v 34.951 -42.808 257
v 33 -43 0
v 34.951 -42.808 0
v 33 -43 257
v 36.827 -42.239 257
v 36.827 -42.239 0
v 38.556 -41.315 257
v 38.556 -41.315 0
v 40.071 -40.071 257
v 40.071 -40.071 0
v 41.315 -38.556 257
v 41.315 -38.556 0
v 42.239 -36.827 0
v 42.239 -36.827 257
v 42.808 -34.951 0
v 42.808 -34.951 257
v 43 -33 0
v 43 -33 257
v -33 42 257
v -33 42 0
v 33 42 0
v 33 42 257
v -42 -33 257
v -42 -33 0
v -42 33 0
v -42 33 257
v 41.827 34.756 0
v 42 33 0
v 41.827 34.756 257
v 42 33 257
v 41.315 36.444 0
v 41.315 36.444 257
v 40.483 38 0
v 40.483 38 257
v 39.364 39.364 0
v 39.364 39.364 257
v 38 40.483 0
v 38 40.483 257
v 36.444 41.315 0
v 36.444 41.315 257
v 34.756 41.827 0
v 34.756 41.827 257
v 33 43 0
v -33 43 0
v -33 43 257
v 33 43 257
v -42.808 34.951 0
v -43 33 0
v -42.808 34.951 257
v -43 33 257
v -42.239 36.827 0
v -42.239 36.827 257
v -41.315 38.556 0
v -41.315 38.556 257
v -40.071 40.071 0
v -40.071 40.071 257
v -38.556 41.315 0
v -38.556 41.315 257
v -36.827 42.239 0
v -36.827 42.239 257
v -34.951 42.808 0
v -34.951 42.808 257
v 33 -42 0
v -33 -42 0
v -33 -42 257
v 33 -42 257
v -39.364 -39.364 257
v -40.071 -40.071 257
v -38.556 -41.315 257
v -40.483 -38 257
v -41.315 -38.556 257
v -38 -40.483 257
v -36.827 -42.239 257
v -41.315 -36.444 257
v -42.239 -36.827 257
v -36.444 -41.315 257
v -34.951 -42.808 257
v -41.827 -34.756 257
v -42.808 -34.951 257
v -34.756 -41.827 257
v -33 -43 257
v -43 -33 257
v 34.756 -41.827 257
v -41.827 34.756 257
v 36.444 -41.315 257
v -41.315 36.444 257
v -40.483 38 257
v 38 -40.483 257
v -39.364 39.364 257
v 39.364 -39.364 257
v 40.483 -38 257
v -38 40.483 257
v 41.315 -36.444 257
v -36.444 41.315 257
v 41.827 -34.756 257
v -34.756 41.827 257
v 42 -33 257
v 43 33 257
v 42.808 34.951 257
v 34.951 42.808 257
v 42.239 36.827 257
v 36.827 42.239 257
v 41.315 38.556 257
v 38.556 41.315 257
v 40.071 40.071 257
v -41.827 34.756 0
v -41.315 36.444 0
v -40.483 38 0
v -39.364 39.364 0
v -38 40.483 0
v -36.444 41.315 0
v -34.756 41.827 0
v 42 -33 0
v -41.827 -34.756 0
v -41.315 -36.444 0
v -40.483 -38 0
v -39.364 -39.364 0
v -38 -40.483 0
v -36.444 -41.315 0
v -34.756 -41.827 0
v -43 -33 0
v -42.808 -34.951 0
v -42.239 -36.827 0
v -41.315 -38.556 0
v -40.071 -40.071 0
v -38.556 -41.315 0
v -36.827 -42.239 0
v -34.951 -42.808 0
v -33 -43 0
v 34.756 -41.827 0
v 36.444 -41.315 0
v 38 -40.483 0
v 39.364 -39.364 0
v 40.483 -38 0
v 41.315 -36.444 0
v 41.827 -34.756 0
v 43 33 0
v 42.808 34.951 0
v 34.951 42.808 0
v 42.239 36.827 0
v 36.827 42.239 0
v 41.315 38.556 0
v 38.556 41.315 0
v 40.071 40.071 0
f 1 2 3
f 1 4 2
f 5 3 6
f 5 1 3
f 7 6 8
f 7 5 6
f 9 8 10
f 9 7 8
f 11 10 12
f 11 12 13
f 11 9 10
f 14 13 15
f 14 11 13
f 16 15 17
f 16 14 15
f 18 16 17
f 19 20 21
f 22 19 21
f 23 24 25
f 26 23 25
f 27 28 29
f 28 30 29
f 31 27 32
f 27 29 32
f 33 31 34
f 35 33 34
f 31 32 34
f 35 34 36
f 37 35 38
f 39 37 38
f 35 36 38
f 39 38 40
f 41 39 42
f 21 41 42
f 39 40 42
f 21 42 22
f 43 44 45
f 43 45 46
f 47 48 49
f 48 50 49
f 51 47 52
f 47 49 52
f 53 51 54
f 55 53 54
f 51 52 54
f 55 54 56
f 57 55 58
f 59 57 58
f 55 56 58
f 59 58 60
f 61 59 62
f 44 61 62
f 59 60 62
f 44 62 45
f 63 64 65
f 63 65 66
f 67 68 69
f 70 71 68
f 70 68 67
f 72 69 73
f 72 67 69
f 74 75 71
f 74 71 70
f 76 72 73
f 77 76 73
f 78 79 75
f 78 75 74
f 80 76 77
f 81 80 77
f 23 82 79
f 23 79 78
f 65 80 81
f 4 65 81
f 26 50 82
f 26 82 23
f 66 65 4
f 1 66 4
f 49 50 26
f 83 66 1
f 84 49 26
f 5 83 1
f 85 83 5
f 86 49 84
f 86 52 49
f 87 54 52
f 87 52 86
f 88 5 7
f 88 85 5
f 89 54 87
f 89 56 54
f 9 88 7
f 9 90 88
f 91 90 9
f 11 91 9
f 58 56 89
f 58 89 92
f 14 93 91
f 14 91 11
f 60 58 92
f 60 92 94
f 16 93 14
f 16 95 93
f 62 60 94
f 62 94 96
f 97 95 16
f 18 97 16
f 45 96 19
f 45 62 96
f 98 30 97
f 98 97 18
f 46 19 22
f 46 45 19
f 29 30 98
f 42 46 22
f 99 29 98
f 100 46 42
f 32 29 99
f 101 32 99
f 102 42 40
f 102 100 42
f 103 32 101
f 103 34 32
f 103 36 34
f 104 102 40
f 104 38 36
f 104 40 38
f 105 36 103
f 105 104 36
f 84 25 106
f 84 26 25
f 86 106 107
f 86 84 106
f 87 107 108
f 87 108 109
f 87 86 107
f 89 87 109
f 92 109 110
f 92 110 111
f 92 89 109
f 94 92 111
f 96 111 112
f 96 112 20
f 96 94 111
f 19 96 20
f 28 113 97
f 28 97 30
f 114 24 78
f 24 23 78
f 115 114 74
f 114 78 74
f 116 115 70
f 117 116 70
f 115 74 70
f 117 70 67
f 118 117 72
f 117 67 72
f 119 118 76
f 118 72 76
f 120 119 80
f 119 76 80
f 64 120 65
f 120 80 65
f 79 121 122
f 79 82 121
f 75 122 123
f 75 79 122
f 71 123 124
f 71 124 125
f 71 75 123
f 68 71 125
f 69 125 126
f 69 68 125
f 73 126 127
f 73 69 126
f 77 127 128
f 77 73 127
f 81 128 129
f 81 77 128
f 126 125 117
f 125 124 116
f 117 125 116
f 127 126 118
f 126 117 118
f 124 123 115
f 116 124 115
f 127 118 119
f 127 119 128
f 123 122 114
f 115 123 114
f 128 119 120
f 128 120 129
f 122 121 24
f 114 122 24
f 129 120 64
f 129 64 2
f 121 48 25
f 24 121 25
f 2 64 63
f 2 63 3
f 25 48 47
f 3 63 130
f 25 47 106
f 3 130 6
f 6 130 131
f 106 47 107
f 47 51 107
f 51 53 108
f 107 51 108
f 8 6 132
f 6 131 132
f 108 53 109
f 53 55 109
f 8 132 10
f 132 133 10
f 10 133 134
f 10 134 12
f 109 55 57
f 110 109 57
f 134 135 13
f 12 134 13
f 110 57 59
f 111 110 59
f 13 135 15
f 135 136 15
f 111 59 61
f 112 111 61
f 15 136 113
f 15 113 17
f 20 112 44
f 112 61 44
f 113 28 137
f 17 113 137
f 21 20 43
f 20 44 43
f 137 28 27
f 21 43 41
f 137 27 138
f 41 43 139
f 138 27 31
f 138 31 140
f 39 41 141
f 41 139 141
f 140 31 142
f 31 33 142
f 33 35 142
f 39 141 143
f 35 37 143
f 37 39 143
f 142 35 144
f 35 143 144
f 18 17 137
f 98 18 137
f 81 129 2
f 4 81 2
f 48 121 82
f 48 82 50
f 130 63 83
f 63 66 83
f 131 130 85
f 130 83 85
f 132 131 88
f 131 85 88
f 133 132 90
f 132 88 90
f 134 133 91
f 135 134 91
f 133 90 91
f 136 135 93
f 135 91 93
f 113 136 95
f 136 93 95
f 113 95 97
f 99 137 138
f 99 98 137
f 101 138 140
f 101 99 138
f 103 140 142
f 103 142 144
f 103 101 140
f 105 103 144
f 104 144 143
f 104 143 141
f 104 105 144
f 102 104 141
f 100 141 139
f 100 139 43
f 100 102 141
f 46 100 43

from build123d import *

# Parameters (mm, degrees)
F0_W     = 86
F0_H     = 86
F1_DEPTH = 257
F2_R     = 10
F3_T     = -1


with BuildPart() as f1:
    # F0 (on Top) → F1 (new body)
    with BuildSketch(Plane.XY):
        Rectangle(F0_W, F0_H)
    extrude(amount=F1_DEPTH)

    # F2
    f2_edges = [f1.edges().sort_by_distance(p)[0] for p in [
        (43, 43, 128.5),
        (-43, -43, 128.5),
        (43, -43, 128.5),
        (-43, 43, 128.5),
    ]]
    fillet(f2_edges, radius=F2_R)

    # F3
    f3_openings = [f1.faces().sort_by_distance(p)[0] for p in [
        (0, 0, 257),
        (0, 0, 0),
    ]]
    offset(amount=F3_T, openings=f3_openings)


solid = f1.part
